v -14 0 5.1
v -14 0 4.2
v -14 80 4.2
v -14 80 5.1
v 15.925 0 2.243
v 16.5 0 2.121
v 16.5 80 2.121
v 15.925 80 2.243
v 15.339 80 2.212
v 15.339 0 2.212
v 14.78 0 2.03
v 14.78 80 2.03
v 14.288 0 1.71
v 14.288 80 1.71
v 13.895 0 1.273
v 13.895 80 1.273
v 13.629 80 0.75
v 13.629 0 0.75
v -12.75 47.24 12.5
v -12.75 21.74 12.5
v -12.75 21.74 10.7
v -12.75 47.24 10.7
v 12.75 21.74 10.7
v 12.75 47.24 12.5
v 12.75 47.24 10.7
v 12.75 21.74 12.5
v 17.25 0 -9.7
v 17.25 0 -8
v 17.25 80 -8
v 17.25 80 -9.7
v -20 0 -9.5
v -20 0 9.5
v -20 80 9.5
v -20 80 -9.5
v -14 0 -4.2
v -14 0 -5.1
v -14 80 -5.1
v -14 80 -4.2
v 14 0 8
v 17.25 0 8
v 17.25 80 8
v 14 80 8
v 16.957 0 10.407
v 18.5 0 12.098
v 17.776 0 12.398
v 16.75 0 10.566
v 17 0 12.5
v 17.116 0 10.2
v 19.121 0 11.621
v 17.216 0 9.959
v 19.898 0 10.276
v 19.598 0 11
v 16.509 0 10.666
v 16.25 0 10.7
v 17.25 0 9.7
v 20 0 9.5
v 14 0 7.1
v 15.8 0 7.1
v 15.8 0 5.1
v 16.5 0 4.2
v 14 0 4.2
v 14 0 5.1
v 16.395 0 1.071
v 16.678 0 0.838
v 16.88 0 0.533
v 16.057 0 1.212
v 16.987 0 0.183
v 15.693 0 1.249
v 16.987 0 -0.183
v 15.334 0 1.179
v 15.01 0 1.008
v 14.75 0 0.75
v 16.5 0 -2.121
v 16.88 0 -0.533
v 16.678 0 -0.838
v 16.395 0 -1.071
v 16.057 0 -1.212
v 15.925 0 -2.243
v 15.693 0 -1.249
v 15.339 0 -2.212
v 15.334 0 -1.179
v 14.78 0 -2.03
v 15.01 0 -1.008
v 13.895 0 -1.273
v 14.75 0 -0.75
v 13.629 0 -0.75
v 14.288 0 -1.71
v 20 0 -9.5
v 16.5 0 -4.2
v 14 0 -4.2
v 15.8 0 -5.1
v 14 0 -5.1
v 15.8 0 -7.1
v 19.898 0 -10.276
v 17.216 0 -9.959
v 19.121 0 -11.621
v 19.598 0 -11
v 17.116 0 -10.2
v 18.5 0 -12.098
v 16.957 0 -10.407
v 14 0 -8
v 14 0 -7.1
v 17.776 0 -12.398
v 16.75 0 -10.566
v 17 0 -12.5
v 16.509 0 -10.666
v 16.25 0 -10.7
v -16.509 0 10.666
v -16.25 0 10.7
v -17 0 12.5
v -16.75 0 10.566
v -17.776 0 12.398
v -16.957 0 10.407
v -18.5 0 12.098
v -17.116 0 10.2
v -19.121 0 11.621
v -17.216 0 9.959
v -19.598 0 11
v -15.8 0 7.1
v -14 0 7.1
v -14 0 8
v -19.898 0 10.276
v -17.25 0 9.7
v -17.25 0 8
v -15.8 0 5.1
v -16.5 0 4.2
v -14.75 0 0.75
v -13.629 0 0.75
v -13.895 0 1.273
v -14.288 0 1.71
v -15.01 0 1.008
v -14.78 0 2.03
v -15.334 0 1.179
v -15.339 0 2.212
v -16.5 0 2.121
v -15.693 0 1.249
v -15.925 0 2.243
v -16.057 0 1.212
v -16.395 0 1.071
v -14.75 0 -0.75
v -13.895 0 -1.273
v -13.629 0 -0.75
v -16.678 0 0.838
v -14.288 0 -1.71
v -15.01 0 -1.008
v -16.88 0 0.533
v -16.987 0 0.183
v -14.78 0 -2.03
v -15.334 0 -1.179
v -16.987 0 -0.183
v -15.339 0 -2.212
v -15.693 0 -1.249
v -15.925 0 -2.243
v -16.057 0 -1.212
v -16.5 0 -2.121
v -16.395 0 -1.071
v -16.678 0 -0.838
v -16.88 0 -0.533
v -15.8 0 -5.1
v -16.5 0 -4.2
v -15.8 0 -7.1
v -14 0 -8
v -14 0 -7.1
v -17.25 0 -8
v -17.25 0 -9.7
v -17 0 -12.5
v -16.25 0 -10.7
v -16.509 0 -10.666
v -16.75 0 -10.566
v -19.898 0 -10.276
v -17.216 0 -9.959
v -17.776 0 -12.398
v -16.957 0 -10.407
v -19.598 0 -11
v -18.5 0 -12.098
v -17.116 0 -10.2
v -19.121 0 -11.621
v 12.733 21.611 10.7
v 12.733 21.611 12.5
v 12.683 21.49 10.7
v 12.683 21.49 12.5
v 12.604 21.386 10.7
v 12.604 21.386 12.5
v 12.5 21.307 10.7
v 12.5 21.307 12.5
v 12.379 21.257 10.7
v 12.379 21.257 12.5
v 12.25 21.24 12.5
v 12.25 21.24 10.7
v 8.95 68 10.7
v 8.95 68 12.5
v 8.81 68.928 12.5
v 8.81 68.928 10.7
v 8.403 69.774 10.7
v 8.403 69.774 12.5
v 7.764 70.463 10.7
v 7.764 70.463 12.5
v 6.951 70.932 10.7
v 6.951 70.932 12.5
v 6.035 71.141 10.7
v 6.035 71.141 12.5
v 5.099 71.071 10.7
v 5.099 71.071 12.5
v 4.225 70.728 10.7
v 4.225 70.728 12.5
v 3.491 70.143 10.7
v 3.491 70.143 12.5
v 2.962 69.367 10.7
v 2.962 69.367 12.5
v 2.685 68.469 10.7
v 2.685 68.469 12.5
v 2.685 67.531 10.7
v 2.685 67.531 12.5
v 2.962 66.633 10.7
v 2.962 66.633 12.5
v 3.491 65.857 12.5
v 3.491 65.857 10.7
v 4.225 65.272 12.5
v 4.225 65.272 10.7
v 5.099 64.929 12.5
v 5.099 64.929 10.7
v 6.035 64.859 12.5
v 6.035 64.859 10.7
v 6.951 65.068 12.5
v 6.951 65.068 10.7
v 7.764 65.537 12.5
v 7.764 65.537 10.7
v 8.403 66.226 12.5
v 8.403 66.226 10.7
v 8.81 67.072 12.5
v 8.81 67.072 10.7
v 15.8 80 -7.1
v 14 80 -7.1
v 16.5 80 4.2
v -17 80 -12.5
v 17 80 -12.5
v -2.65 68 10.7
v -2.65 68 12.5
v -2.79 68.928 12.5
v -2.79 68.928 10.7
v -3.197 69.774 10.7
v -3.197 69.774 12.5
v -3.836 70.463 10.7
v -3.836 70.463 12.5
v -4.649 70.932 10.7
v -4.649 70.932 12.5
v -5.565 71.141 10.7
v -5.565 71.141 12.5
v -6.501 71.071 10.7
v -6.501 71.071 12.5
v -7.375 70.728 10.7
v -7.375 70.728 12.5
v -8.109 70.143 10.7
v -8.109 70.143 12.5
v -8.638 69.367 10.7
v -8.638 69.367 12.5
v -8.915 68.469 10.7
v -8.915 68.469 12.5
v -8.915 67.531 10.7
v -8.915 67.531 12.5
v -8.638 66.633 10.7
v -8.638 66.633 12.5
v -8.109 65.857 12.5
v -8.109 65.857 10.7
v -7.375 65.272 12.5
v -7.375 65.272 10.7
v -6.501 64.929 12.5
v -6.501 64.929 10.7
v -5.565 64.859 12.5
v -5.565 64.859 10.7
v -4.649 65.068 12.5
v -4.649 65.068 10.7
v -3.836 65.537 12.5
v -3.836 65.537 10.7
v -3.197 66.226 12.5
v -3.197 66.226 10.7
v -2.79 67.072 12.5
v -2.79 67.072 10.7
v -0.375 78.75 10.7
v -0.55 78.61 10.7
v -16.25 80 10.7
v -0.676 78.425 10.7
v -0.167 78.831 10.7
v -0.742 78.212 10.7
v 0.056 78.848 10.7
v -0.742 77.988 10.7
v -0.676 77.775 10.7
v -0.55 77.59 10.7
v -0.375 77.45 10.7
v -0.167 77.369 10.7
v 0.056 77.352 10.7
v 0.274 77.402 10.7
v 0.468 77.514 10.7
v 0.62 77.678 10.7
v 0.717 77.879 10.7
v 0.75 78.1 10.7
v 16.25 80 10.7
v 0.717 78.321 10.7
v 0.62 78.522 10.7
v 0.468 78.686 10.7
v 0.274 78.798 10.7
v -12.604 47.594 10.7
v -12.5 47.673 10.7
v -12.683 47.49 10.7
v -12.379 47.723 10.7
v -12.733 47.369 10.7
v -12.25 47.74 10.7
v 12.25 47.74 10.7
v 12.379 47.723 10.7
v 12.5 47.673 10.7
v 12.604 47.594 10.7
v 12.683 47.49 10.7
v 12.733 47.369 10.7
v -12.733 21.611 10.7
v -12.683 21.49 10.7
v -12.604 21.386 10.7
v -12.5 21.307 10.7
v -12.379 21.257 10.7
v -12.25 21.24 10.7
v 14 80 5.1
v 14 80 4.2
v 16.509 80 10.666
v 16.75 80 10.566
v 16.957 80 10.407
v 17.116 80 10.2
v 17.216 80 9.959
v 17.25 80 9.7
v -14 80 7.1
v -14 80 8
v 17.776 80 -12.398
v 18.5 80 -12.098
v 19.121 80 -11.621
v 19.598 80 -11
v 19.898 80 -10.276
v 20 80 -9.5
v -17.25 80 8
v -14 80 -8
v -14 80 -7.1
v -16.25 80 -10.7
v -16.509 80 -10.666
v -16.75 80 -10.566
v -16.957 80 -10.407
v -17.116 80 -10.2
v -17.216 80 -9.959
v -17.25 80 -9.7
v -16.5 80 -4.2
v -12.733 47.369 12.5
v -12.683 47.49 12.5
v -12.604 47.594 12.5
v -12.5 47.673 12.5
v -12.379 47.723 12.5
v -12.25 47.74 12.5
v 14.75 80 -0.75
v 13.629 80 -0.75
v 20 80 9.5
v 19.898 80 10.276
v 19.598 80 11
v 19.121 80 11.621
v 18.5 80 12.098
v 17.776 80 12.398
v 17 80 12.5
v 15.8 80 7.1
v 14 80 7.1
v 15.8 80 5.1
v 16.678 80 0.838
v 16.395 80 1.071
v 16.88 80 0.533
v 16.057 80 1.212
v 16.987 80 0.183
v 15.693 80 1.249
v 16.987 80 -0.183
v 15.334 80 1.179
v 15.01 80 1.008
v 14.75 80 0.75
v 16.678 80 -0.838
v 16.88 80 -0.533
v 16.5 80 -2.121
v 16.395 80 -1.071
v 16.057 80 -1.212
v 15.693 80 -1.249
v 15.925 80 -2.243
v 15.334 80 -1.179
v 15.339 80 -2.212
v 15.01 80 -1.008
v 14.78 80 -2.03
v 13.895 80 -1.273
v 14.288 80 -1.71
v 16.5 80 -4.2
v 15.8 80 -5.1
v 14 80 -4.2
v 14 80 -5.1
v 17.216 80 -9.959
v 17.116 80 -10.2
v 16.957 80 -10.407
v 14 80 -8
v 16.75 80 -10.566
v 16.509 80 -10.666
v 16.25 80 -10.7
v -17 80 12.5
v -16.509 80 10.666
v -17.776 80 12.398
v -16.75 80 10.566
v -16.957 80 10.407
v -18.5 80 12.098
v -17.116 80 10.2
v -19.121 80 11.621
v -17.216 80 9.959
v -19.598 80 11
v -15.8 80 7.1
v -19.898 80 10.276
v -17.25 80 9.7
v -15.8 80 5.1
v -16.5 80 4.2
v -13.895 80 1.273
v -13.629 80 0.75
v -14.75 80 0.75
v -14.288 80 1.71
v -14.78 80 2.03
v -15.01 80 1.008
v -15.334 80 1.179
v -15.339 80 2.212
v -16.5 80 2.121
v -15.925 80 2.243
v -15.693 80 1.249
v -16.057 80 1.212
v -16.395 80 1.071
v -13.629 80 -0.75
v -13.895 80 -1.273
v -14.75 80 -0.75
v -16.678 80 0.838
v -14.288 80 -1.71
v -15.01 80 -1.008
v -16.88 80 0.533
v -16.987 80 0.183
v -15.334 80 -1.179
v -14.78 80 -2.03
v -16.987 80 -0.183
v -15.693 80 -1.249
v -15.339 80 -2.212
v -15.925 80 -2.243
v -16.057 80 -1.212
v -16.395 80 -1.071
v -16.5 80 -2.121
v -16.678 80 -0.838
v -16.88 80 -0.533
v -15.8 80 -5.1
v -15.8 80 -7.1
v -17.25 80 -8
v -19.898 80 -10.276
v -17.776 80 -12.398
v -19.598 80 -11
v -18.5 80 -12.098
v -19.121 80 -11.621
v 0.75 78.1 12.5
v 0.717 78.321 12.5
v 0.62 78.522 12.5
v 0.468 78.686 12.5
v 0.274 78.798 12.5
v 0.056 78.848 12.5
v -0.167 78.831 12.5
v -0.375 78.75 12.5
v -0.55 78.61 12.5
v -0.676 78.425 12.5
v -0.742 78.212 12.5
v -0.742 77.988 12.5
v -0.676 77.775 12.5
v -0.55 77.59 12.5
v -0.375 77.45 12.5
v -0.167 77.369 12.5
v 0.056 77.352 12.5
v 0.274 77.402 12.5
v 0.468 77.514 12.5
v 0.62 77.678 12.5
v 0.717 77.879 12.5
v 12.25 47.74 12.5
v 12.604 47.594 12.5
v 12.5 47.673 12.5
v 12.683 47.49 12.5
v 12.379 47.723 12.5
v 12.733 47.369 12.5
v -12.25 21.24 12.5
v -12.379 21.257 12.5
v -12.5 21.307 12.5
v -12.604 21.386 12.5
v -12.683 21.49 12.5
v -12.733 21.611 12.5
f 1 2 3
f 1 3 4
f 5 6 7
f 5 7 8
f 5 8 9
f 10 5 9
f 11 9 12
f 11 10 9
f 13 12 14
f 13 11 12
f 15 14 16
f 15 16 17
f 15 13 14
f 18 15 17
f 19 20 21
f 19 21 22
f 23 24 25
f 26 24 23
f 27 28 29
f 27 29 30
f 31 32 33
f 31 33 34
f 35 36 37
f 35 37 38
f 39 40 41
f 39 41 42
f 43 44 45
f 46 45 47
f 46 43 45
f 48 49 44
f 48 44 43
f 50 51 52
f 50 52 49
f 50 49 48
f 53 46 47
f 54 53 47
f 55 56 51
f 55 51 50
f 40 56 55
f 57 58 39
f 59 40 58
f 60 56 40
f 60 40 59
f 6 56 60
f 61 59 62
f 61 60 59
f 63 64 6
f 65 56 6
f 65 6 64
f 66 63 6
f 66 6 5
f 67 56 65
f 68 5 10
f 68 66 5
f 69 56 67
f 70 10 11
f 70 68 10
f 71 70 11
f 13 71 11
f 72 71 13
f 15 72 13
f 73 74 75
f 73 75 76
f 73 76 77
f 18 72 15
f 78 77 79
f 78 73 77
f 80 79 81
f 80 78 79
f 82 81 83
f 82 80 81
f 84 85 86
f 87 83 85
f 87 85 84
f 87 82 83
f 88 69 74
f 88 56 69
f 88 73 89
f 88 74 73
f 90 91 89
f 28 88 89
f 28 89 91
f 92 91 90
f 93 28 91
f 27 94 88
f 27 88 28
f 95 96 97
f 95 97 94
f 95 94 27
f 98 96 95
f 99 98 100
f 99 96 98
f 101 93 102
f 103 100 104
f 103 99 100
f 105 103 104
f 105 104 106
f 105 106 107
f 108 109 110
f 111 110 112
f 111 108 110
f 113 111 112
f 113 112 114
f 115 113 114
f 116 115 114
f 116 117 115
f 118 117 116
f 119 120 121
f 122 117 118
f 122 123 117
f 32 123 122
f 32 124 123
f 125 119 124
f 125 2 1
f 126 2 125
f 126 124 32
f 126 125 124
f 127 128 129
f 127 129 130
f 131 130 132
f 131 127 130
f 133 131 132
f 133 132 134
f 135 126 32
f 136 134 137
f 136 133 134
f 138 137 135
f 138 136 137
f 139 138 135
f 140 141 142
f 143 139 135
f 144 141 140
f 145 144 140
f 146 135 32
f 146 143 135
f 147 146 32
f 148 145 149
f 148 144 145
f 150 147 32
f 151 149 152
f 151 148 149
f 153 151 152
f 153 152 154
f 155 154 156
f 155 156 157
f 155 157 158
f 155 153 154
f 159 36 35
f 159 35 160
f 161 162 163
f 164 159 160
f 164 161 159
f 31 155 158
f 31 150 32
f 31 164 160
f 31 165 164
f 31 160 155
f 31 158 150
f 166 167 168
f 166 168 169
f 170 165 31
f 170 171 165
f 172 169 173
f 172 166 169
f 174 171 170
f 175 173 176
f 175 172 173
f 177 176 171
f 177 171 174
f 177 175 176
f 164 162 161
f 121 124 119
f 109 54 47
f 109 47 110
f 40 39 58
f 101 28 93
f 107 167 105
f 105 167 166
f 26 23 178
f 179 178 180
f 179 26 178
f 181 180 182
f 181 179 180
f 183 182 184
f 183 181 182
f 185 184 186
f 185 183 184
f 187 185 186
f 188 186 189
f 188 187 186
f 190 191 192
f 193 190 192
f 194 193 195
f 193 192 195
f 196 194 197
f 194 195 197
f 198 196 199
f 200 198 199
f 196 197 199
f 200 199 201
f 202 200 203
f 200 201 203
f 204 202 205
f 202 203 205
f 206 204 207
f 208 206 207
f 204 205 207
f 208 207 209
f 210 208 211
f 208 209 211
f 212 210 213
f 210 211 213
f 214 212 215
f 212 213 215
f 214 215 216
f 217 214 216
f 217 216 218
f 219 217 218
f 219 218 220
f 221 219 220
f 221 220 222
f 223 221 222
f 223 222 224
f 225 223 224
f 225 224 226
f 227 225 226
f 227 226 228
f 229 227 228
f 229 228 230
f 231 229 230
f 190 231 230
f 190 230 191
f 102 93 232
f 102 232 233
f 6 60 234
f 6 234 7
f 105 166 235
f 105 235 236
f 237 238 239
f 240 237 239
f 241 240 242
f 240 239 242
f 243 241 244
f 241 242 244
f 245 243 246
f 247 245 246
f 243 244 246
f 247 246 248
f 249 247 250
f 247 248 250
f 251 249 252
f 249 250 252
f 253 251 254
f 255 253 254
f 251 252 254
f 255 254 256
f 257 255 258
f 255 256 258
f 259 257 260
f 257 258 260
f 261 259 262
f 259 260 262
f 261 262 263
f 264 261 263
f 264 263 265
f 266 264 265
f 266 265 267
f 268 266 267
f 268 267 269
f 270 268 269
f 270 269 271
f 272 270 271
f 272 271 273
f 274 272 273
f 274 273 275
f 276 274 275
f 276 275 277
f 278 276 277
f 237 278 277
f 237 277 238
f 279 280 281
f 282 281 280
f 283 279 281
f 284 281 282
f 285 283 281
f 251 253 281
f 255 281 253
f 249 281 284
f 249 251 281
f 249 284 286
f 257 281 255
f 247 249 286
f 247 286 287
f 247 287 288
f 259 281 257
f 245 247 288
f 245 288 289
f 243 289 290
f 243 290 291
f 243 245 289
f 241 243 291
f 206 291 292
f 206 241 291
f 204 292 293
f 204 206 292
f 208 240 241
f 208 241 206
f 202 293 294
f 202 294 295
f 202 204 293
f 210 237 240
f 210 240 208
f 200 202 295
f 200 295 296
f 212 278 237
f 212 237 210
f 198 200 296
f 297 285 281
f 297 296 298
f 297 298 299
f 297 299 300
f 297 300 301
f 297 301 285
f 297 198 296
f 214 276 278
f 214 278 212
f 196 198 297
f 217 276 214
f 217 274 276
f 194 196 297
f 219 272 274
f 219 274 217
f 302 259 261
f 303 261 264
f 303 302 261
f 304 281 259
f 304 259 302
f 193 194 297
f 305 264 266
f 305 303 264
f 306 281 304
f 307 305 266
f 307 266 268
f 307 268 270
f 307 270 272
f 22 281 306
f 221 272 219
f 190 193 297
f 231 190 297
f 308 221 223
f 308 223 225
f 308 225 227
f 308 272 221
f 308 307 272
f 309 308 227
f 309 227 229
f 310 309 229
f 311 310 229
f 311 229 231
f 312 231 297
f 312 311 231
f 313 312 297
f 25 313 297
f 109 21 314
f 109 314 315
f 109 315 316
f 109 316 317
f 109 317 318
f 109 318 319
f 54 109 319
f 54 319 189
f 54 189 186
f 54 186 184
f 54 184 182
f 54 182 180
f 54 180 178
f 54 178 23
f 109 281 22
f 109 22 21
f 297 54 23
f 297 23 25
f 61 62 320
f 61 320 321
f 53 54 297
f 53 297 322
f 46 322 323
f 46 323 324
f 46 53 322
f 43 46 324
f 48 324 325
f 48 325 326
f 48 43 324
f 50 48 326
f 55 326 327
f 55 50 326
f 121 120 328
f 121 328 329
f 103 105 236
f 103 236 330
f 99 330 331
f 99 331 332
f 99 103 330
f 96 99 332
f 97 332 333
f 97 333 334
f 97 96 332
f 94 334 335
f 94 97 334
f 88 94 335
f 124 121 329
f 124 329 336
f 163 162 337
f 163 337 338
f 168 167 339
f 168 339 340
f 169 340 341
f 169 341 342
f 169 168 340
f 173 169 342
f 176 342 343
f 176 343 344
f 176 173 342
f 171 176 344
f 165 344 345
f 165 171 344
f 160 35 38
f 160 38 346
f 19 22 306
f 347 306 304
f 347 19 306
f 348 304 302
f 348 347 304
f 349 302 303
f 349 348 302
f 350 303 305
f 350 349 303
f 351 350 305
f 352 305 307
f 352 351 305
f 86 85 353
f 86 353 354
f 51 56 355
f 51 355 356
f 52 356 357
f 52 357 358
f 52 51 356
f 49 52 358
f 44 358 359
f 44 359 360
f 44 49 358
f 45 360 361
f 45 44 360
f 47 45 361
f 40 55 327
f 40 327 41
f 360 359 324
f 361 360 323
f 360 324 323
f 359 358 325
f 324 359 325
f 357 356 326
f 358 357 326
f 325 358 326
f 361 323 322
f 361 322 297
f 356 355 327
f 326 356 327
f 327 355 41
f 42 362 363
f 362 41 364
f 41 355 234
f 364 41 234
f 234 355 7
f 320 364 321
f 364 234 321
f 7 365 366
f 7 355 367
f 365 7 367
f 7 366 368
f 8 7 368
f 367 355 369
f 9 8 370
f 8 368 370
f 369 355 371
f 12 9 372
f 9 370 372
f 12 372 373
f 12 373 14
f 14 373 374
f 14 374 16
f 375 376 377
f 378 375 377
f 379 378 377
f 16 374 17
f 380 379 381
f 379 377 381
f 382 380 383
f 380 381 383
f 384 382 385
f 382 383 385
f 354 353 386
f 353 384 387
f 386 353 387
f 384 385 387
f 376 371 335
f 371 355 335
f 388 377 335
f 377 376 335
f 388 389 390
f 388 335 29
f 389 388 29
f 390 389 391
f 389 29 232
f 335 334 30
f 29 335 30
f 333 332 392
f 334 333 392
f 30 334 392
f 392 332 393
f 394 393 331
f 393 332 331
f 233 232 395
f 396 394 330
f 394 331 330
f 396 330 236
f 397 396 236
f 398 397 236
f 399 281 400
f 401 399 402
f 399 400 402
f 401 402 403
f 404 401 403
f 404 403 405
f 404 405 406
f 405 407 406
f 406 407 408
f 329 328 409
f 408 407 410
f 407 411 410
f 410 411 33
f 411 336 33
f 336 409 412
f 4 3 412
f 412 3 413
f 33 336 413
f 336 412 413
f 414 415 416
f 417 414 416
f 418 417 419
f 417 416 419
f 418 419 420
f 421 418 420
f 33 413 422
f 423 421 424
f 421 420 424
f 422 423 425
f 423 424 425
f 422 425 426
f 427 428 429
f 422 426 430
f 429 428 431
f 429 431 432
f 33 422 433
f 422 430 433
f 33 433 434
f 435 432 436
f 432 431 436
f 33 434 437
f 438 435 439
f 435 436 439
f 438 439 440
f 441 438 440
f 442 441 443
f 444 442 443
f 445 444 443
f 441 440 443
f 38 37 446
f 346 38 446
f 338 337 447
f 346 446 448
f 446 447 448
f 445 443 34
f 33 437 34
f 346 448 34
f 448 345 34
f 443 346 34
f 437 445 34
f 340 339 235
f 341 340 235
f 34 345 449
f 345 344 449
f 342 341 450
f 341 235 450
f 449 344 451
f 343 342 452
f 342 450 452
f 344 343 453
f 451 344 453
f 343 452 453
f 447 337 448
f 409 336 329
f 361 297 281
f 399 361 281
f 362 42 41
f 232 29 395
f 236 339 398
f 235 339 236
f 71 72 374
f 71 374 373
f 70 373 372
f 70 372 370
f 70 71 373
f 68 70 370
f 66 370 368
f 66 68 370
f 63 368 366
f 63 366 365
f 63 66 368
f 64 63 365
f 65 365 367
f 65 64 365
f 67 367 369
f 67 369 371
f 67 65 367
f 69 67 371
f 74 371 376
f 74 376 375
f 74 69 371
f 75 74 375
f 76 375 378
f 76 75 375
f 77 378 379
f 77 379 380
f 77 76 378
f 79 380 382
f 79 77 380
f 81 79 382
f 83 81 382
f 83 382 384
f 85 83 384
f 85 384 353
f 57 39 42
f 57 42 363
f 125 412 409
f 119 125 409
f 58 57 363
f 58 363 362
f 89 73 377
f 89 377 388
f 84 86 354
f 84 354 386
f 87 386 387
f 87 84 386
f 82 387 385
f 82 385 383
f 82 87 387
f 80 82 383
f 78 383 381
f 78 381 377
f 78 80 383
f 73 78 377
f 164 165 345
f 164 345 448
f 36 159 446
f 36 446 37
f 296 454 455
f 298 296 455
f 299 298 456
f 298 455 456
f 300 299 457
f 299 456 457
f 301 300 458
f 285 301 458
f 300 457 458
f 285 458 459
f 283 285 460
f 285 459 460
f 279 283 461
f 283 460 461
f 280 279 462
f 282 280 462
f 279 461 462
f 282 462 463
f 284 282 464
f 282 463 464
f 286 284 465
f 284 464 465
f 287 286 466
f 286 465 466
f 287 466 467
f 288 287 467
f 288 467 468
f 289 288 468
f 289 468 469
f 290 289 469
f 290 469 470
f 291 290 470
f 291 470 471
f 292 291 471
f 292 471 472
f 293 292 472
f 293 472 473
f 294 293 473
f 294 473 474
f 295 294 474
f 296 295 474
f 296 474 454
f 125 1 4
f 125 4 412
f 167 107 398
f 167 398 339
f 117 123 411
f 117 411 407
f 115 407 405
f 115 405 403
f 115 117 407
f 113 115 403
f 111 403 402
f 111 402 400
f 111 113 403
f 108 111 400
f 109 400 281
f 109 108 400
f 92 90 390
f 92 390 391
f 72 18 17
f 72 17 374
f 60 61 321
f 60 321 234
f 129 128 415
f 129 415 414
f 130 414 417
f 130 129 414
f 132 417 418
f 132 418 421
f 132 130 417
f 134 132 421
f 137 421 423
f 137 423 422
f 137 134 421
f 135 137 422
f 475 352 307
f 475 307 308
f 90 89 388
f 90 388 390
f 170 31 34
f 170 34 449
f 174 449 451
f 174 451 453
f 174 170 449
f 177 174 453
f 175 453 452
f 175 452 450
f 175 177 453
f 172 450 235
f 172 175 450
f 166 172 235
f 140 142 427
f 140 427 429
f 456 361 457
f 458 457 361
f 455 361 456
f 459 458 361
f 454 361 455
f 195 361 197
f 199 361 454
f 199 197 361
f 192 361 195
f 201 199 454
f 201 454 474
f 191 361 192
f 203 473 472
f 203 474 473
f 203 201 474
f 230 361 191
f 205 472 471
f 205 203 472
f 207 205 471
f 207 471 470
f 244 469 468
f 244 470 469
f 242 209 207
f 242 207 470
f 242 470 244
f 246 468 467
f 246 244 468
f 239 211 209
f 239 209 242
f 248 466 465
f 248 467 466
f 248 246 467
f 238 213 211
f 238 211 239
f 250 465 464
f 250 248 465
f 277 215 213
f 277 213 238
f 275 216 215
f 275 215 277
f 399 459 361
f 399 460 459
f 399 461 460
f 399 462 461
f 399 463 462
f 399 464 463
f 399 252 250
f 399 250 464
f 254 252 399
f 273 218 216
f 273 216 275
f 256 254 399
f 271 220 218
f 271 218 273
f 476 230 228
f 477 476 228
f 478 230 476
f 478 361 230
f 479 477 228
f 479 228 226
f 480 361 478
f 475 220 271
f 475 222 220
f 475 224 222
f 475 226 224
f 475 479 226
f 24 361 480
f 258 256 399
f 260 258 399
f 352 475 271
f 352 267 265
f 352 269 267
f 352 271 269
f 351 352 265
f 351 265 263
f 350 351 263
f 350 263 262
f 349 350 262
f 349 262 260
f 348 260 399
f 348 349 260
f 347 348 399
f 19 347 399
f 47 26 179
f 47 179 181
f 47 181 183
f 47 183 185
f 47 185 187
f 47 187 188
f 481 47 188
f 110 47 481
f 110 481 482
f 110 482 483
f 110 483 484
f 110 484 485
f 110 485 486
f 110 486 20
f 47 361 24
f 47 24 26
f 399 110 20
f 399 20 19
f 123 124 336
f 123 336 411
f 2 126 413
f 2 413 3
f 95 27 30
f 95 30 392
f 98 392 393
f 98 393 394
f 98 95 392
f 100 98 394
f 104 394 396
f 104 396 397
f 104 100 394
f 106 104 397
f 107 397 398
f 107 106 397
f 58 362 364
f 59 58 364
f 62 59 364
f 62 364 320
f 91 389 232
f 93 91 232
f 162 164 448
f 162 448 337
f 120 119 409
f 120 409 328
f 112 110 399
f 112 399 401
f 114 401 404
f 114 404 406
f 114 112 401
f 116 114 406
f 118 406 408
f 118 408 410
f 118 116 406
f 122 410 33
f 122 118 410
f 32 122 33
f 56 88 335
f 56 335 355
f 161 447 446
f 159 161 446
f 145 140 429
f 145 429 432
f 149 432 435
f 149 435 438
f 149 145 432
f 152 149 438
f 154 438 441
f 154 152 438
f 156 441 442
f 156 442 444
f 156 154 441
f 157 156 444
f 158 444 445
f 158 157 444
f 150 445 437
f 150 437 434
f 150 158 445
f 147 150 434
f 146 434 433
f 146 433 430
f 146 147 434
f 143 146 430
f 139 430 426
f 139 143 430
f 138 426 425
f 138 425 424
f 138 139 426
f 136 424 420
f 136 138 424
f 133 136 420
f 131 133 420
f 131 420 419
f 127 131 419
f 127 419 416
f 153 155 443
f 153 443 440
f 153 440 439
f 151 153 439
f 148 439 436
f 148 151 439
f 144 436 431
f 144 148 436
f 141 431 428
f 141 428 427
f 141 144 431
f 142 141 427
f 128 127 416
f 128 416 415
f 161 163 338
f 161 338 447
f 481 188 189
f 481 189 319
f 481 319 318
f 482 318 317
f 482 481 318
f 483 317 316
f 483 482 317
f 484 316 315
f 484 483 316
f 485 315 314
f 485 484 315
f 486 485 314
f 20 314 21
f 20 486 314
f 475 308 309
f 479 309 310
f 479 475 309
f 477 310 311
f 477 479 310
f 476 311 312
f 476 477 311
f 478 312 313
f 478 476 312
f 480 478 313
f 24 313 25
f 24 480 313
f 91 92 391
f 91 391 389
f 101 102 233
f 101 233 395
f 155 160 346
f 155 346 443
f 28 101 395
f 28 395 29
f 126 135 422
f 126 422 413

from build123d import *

# Parameters (mm, degrees)
EXTRUDE_1_DEPTH     = 80
CUT_EXTRUDE_1_REACH = 88.168
CUT_EXTRUDE_2_REACH = 88.168
SKETCH_3_R          = 3.15
CUT_EXTRUDE_3_REACH = 88.168
SKETCH_4_R          = 0.75


with BuildPart() as part:
    # 草图1 → 凸台-拉伸1 (new body)
    with BuildSketch(Plane(origin=(0, 0, 0), x_dir=(1, 0, 0), z_dir=(0, 1, 0))):
        with BuildLine():
            Line((-17, 12.5), (17, 12.5))
            ThreePointArc((17, 12.5), (19.121320344, 11.621320344), (20, 9.5))
            Line((20, 9.5), (20, -9.5))
            ThreePointArc((20, -9.5), (19.121320344, -11.621320344), (17, -12.5))
            Line((17, -12.5), (-17, -12.5))
            ThreePointArc((-17, -12.5), (-19.121320344, -11.621320344), (-20, -9.5))
            Line((-20, -9.5), (-20, 9.5))
            ThreePointArc((-20, 9.5), (-19.121320344, 11.621320344), (-17, 12.5))
        make_face()
        with BuildLine():
            Line((-17.25, 8), (-14, 8))
            Line((-14, 8), (-14, 7.1))
            Line((-14, 7.1), (-15.8, 7.1))
            Line((-15.8, 7.1), (-15.8, 5.1))
            Line((-15.8, 5.1), (-14, 5.1))
            Line((-14, 5.1), (-14, 4.2))
            Line((-14, 4.2), (-16.5, 4.2))
            Line((-16.5, 4.2), (-16.5, 2.121320344))
            ThreePointArc((-16.5, 2.121320344), (-14.780330086, 2.030330086), (-13.628679656, 0.75))
            Line((-13.628679656, 0.75), (-14.75, 0.75))
            ThreePointArc((-14.75, 0.75), (-17, 0), (-14.75, -0.75))
            Line((-14.75, -0.75), (-13.628679656, -0.75))
            ThreePointArc((-13.628679656, -0.75), (-14.780330086, -2.030330086), (-16.5, -2.121320344))
            Line((-16.5, -2.121320344), (-16.5, -4.2))
            Line((-16.5, -4.2), (-14, -4.2))
            Line((-14, -4.2), (-14, -5.1))
            Line((-14, -5.1), (-15.8, -5.1))
            Line((-15.8, -5.1), (-15.8, -7.1))
            Line((-15.8, -7.1), (-14, -7.1))
            Line((-14, -7.1), (-14, -8))
            Line((-14, -8), (-17.25, -8))
            Line((-17.25, -8), (-17.25, -9.7))
            ThreePointArc((-17.25, -9.7), (-16.957106781, -10.407106781), (-16.25, -10.7))
            Line((-16.25, -10.7), (16.25, -10.7))
            ThreePointArc((16.25, -10.7), (16.957106781, -10.407106781), (17.25, -9.7))
            Line((17.25, -9.7), (17.25, -8))
            Line((17.25, -8), (14, -8))
            Line((14, -8), (14, -7.1))
            Line((14, -7.1), (15.8, -7.1))
            Line((15.8, -7.1), (15.8, -5.1))
            Line((15.8, -5.1), (14, -5.1))
            Line((14, -5.1), (14, -4.2))
            Line((14, -4.2), (16.5, -4.2))
            Line((16.5, -4.2), (16.5, -2.121320344))
            ThreePointArc((16.5, -2.121320344), (14.780330086, -2.030330086), (13.628679656, -0.75))
            Line((13.628679656, -0.75), (14.75, -0.75))
            ThreePointArc((14.75, -0.75), (17, 0), (14.75, 0.75))
            Line((14.75, 0.75), (13.628679656, 0.75))
            ThreePointArc((13.628679656, 0.75), (14.780330086, 2.030330086), (16.5, 2.121320344))
            Line((16.5, 2.121320344), (16.5, 4.2))
            Line((16.5, 4.2), (14, 4.2))
            Line((14, 4.2), (14, 5.1))
            Line((14, 5.1), (15.8, 5.1))
            Line((15.8, 5.1), (15.8, 7.1))
            Line((15.8, 7.1), (14, 7.1))
            Line((14, 7.1), (14, 8))
            Line((14, 8), (17.25, 8))
            Line((17.25, 8), (17.25, 9.7))
            ThreePointArc((17.25, 9.7), (16.957106781, 10.407106781), (16.25, 10.7))
            Line((16.25, 10.7), (-16.25, 10.7))
            ThreePointArc((-16.25, 10.7), (-16.957106781, 10.407106781), (-17.25, 9.7))
            Line((-17.25, 9.7), (-17.25, 8))
        make_face(mode=Mode.SUBTRACT)
    extrude(amount=EXTRUDE_1_DEPTH)

    # 草图2 → 切除-拉伸1 (cut, up to next)
    with BuildSketch(Plane.XY.offset(12.5), mode=Mode.PRIVATE) as cut_extrude_1_sk1:
        with BuildLine():
            Line((-12.25, 47.74), (12.25, 47.74))
            ThreePointArc((12.25, 47.74), (12.603553391, 47.593553391), (12.75, 47.24))
            Line((12.75, 47.24), (12.75, 21.74))
            ThreePointArc((12.75, 21.74), (12.603553391, 21.386446609), (12.25, 21.24))
            Line((12.25, 21.24), (-12.25, 21.24))
            ThreePointArc((-12.25, 21.24), (-12.603553391, 21.386446609), (-12.75, 21.74))
            Line((-12.75, 21.74), (-12.75, 47.24))
            ThreePointArc((-12.75, 47.24), (-12.603553391, 47.593553391), (-12.25, 47.74))
        make_face()
    cut_extrude_1_tool1 = extrude(cut_extrude_1_sk1.sketch, amount=-CUT_EXTRUDE_1_REACH, mode=Mode.PRIVATE) & part.part
    add(cut_extrude_1_tool1.solids().sort_by_distance((0, 34.49, 12.5))[0], mode=Mode.SUBTRACT)

    # 草图3 → 切除-拉伸2 (cut, up to next)
    with BuildSketch(Plane.XY.offset(12.5), mode=Mode.PRIVATE) as cut_extrude_2_sk1:
        with Locations((-5.8, 68)):
            Circle(SKETCH_3_R)
    cut_extrude_2_tool1 = extrude(cut_extrude_2_sk1.sketch, amount=-CUT_EXTRUDE_2_REACH, mode=Mode.PRIVATE) & part.part
    # 草图3 → 切除-拉伸2 (cut, up to next)
    with BuildSketch(Plane.XY.offset(12.5), mode=Mode.PRIVATE) as cut_extrude_2_sk2:
        with Locations((5.8, 68)):
            Circle(SKETCH_3_R)
    cut_extrude_2_tool2 = extrude(cut_extrude_2_sk2.sketch, amount=-CUT_EXTRUDE_2_REACH, mode=Mode.PRIVATE) & part.part
    add(cut_extrude_2_tool1.solids().sort_by_distance((-5.8, 68, 12.5))[0], mode=Mode.SUBTRACT)
    add(cut_extrude_2_tool2.solids().sort_by_distance((5.8, 68, 12.5))[0], mode=Mode.SUBTRACT)

    # 草图4 → 切除-拉伸3 (cut, up to next)
    with BuildSketch(Plane.XY.offset(12.5), mode=Mode.PRIVATE) as cut_extrude_3_sk1:
        with Locations((0, 78.1)):
            Circle(SKETCH_4_R)
    cut_extrude_3_tool1 = extrude(cut_extrude_3_sk1.sketch, amount=-CUT_EXTRUDE_3_REACH, mode=Mode.PRIVATE) & part.part
    add(cut_extrude_3_tool1.solids().sort_by_distance((0, 78.1, 12.5))[0], mode=Mode.SUBTRACT)


solid = part.part
